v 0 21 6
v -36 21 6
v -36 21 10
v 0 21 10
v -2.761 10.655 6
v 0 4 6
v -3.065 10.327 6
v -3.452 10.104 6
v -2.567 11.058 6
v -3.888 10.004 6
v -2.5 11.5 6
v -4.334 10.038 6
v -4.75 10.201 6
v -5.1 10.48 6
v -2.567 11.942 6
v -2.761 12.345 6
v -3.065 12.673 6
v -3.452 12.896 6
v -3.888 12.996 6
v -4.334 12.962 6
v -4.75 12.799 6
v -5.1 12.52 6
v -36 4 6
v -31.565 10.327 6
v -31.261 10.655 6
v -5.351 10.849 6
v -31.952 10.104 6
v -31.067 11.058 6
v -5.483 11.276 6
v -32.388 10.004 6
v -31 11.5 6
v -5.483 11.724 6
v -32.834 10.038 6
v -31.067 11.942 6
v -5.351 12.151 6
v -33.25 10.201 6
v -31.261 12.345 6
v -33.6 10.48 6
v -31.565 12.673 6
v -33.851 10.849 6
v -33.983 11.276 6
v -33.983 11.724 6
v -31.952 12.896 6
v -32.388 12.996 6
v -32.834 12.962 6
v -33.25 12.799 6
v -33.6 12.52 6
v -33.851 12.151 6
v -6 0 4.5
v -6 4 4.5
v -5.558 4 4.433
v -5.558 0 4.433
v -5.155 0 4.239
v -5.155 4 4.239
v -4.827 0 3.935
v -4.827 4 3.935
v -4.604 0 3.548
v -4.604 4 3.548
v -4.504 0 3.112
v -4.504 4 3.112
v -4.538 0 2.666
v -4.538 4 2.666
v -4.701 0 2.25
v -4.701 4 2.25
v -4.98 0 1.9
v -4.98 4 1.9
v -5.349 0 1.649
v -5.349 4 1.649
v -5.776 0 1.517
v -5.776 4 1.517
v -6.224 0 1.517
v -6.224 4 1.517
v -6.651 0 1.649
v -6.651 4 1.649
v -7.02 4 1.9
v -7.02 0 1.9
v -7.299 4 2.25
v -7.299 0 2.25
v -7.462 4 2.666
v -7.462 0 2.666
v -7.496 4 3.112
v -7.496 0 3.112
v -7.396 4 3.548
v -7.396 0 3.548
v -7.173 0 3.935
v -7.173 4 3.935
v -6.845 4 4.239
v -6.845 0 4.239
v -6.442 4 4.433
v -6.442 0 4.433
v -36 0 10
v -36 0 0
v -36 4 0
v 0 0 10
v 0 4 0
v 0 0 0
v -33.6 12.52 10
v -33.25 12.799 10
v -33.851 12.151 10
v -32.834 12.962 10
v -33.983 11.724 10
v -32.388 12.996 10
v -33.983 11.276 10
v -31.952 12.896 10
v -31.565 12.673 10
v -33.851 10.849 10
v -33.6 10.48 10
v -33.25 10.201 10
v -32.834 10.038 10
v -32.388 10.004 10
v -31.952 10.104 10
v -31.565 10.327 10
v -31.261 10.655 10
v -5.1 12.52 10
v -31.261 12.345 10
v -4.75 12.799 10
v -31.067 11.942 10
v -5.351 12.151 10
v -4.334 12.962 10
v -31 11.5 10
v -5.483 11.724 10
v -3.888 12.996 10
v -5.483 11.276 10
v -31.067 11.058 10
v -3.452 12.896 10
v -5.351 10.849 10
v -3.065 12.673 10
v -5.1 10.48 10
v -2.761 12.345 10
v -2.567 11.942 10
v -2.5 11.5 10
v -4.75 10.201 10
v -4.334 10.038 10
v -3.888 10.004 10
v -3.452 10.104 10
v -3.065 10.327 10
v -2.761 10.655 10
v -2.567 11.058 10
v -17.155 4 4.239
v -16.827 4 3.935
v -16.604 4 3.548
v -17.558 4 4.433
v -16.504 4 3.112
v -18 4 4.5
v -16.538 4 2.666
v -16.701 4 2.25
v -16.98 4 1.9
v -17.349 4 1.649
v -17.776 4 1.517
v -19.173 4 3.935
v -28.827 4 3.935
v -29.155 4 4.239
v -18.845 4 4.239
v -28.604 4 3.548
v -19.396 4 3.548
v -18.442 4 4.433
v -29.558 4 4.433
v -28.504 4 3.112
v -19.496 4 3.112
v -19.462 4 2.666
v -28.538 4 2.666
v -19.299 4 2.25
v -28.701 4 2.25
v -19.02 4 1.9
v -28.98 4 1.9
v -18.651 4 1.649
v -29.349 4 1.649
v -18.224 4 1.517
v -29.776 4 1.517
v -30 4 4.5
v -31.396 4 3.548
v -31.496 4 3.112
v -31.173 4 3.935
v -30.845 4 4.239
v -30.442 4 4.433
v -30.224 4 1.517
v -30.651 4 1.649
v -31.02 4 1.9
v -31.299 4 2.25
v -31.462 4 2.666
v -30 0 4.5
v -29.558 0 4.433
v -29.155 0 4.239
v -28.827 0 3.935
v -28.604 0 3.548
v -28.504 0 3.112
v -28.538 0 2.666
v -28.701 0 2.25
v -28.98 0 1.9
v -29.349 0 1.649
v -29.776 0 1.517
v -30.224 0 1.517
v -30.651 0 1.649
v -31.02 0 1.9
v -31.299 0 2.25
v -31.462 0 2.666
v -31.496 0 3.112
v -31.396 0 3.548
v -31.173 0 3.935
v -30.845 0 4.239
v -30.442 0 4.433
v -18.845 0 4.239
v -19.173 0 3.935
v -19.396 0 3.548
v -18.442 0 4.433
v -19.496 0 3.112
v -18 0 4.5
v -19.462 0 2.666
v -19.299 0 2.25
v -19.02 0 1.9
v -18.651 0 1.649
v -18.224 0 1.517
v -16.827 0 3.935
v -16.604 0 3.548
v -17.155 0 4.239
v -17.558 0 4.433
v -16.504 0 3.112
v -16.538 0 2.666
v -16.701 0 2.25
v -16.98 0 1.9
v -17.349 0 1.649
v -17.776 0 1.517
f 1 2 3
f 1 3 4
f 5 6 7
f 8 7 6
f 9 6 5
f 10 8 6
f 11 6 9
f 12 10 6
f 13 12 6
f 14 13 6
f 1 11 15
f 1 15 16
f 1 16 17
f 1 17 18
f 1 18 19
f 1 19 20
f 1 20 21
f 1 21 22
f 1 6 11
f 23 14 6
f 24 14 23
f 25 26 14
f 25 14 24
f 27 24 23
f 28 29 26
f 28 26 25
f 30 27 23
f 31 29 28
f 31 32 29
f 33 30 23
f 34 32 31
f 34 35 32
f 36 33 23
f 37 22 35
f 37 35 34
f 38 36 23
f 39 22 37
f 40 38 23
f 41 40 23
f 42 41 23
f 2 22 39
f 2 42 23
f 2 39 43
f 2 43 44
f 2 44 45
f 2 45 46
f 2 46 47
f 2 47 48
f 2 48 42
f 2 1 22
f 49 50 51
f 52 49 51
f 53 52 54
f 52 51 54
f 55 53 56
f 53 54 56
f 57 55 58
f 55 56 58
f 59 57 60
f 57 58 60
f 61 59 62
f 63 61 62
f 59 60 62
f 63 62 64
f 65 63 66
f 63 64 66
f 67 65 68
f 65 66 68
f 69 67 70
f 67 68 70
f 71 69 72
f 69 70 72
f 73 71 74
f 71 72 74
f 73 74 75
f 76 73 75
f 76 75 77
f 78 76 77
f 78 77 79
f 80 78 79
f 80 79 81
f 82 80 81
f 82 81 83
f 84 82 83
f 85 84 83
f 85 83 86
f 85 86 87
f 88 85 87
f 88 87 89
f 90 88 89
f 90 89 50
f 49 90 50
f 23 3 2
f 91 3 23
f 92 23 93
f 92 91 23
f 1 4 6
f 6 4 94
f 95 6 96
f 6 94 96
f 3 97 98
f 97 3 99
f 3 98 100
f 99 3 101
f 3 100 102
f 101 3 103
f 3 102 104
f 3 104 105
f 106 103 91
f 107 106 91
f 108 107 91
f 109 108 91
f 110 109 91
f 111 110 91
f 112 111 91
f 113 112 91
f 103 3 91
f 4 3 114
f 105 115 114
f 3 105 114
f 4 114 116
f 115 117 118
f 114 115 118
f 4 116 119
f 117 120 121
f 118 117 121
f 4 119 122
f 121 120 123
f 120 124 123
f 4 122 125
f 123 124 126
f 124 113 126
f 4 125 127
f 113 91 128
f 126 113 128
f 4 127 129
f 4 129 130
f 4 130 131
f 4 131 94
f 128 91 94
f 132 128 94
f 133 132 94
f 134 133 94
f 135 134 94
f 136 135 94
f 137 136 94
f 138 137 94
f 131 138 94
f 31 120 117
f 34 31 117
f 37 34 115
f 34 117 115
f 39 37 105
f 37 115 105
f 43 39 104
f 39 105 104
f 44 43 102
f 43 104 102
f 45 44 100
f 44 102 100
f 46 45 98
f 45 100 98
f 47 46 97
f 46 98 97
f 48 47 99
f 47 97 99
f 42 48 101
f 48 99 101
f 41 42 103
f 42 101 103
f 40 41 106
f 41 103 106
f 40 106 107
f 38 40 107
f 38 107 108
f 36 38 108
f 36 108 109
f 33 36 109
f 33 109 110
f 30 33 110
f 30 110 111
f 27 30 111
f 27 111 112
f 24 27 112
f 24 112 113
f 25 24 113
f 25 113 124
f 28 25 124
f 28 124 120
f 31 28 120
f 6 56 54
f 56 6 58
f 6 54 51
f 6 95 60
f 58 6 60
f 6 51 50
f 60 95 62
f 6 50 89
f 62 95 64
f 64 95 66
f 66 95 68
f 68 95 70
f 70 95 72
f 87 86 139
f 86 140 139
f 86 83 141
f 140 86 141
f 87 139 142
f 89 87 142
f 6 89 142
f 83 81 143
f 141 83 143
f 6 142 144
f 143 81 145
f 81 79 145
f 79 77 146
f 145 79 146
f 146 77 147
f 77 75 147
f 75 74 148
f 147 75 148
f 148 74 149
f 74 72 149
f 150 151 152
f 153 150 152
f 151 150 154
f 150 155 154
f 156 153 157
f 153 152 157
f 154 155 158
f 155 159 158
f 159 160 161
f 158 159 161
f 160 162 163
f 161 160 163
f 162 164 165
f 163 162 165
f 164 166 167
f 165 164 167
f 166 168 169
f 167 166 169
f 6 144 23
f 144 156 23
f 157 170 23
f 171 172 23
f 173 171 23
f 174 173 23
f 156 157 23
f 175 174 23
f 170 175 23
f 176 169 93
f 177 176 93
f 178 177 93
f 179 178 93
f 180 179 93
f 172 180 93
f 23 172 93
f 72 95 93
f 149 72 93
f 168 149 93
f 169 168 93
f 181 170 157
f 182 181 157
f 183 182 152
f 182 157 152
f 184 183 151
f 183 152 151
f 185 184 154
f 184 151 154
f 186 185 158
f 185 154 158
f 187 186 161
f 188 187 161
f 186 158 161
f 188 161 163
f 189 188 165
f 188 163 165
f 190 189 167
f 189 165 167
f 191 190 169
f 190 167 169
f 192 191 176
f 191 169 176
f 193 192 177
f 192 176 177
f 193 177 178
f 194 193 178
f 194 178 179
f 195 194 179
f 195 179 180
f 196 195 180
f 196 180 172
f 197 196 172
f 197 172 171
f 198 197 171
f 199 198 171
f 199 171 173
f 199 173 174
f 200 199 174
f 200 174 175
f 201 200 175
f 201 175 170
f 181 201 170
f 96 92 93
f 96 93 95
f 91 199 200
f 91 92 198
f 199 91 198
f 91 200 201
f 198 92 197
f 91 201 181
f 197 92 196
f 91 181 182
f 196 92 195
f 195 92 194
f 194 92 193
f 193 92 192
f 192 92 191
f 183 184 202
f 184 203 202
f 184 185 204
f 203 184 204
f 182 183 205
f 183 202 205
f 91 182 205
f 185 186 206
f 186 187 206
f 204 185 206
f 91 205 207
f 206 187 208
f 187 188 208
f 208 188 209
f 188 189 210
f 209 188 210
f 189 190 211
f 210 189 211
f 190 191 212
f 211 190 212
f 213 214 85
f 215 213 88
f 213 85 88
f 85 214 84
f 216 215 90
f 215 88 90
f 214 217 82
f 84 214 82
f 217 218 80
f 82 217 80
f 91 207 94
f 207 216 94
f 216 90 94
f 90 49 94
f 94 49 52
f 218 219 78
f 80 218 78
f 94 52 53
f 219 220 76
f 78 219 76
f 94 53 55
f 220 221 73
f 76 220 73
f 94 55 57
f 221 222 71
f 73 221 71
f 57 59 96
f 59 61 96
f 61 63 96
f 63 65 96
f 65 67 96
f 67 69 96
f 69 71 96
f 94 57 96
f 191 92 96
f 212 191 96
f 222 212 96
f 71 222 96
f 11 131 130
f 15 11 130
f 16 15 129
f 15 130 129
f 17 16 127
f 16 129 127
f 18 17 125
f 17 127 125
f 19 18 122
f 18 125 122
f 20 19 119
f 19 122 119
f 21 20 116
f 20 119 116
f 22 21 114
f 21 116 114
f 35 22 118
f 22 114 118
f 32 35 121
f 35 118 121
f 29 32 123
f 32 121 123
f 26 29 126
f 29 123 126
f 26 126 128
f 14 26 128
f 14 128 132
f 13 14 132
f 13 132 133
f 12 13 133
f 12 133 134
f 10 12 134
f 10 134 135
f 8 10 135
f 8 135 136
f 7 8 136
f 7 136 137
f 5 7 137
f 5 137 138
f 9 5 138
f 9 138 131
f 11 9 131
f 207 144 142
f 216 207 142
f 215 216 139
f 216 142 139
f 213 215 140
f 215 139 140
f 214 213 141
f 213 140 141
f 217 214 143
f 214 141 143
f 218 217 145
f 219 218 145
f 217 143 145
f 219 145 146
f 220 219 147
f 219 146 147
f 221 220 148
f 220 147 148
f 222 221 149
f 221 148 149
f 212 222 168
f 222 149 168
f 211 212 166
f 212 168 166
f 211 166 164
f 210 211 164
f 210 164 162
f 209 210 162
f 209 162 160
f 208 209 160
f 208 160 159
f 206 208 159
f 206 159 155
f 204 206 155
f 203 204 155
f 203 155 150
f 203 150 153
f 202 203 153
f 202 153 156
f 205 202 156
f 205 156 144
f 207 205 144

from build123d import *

# Parameters (mm, degrees)
CROQUIS1_W              = 36
CROQUIS1_H              = 10
SALIENTE_EXTRUIR1_DEPTH = 7
CROQUIS3_W              = 36
CROQUIS3_H              = 4
SALIENTE_EXTRUIR2_DEPTH = 14
CROQUIS4_R              = 1.5
CORTAR_EXTRUIR1_DEPTH   = 10
CROQUIS5_R              = 1.5
CORTAR_EXTRUIR2_DEPTH   = 10
CROQUIS6_W              = 36
CROQUIS6_H              = 3
CORTAR_EXTRUIR3_DEPTH   = 6


with BuildPart() as part:
    # Croquis1 → Saliente-Extruir1 (new body)
    with BuildSketch(Plane(origin=(0, 0, 0), x_dir=(1, 0, 0), z_dir=(0, 1, 0))):
        with Locations((-18, -5)):
            Rectangle(CROQUIS1_W, CROQUIS1_H)
    extrude(amount=SALIENTE_EXTRUIR1_DEPTH)

    # Croquis3 → Saliente-Extruir2 (add)
    with BuildSketch(Plane(origin=(0, 7, 0), x_dir=(1, 0, 0), z_dir=(0, 1, 0))):
        with Locations((-18, -8)):
            Rectangle(CROQUIS3_W, CROQUIS3_H)
    extrude(amount=SALIENTE_EXTRUIR2_DEPTH)

    # Croquis4 → Cortar-Extruir1 (cut)
    with BuildSketch(Plane(origin=(0, 7, 0), x_dir=(1, 0, 0), z_dir=(0, 1, 0))):
        with Locations(Location((-30, -3, 0), (0, 0, 270))):
            Circle(CROQUIS4_R)
        with Locations(Location((-18, -3, 0), (0, 0, 270))):
            Circle(CROQUIS4_R)
        with Locations(Location((-6, -3, 0), (0, 0, 270))):
            Circle(CROQUIS4_R)
    extrude(amount=-CORTAR_EXTRUIR1_DEPTH, mode=Mode.SUBTRACT)

    # Croquis5 → Cortar-Extruir2 (cut)
    with BuildSketch(Plane.XY.offset(10)):
        with Locations((-32.5, 11.5)):
            Circle(CROQUIS5_R)
        with Locations((-4, 11.5)):
            Circle(CROQUIS5_R)
    extrude(amount=-CORTAR_EXTRUIR2_DEPTH, mode=Mode.SUBTRACT)

    # Croquis6 → Cortar-Extruir3 (cut)
    with BuildSketch(Plane(origin=(0, 0, 0), x_dir=(-1, 0, 0), z_dir=(0, 0, -1))):
        with Locations((18, 5.5)):
            Rectangle(CROQUIS6_W, CROQUIS6_H)
    extrude(amount=-CORTAR_EXTRUIR3_DEPTH, mode=Mode.SUBTRACT)


solid = part.part
